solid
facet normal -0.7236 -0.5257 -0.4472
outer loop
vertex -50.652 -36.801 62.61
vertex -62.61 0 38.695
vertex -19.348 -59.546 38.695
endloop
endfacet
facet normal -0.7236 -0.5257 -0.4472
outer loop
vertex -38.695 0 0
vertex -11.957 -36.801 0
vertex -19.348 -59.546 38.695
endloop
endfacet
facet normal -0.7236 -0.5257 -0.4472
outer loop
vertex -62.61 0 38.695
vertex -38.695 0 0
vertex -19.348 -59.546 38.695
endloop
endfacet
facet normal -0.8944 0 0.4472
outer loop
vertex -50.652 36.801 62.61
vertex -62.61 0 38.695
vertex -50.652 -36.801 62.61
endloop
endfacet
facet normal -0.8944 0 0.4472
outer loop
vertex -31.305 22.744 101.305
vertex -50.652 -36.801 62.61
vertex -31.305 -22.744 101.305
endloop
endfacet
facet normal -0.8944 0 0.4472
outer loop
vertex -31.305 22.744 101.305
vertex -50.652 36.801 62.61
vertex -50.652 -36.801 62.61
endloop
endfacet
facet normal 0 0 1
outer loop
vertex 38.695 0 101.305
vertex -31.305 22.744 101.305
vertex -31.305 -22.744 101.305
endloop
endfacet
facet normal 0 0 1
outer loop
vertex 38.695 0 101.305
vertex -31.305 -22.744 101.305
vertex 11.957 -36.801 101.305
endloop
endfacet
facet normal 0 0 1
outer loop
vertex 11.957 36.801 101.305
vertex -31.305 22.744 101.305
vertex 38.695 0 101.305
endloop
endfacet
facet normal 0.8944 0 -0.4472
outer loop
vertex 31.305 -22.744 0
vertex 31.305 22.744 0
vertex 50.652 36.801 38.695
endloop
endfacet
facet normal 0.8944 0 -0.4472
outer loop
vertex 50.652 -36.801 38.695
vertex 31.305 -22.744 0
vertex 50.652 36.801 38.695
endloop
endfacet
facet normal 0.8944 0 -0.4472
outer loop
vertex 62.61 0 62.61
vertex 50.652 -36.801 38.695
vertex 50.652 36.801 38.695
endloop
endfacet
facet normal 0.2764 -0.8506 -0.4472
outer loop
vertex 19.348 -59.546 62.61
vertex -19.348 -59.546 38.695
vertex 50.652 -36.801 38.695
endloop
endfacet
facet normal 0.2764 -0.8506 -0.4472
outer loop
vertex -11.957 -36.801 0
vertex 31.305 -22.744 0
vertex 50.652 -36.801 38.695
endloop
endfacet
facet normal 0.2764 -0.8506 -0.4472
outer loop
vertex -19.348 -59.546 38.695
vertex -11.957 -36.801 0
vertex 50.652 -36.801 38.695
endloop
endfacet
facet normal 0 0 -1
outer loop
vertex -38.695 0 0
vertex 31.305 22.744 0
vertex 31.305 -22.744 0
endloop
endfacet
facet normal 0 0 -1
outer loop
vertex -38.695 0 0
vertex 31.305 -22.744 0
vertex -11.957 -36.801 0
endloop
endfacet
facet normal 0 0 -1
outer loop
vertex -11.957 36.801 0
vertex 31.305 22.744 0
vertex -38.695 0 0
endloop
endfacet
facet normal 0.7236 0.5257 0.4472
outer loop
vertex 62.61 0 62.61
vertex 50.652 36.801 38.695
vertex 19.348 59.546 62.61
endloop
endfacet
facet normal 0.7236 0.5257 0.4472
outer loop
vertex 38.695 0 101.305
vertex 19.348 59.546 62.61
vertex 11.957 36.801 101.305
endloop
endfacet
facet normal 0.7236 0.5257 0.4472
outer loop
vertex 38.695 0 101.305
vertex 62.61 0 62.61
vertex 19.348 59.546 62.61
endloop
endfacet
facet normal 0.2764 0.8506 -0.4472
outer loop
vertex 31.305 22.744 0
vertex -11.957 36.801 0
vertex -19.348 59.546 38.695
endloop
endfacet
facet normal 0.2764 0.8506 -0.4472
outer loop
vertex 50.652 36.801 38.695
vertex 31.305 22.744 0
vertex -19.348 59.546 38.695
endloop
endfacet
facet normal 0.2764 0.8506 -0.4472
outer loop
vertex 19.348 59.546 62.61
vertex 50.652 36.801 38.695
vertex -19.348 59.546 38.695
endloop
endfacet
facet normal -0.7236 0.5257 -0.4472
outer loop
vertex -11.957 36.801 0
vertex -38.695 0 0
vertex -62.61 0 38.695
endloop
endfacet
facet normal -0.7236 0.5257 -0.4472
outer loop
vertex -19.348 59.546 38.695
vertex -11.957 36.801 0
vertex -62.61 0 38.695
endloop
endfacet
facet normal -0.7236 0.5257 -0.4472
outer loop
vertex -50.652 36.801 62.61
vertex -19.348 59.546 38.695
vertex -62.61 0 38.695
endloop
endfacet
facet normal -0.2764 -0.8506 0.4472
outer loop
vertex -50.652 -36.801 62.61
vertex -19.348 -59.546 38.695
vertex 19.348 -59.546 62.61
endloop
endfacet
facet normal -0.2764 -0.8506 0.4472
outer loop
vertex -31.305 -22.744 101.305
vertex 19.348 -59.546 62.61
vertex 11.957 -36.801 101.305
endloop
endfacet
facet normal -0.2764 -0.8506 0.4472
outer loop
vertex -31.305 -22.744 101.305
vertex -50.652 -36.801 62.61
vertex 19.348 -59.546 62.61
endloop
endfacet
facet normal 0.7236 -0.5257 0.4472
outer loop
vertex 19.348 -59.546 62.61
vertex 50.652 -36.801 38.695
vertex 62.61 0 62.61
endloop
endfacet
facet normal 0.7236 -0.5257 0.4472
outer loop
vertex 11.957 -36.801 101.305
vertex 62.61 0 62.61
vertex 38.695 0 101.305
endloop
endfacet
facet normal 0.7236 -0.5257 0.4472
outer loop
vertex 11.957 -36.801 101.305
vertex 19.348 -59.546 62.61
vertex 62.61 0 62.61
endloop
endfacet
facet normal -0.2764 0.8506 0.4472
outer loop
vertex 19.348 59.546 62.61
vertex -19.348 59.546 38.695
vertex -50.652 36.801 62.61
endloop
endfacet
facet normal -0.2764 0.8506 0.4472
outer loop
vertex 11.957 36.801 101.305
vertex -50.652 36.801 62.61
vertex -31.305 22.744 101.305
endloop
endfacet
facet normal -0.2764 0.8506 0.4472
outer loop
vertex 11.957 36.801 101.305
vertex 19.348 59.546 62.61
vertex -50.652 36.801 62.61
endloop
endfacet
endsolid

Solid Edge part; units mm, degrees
sketch "Sketch1" plane through (0, 0, 0) normal (0, -1, 0) x (1, 0, 0)
  line L0 (0, 151.7064) -> (0, -50.4015)
  arc A0 (0, 151.7065) -> (0, -50.4015) centre (0, 50.6525) cw
revolve "RevolvedProtrusion1" add sketch "Sketch1" angle 360 about axis through (0, 0, 151.7064) along (0, 0, -1)
sketch "Sketch2" plane through (0, 0, 0) normal (0, -1, 0) x (1, 0, 0)
  line L0 (62.6099, 62.6099) -> (31.305, 0)
  line L1 (31.305, 0) -> (-38.695, 0)
extrude "Cutout1" cut sketch "Sketch2" along normal mid plane 851.8671 material side at (47.0022, 0, 31.2826)
sketch "Sketch3" plane through (0, 0, 0) normal (0, -1, 0) x (1, 0, 0)
  line L0 (-31.305, 101.305) -> (38.695, 101.305)
  line L1 (-62.6099, 38.695) -> (-31.305, 101.305)
extrude "ExtrudedCutout_17" cut sketch "Sketch3" along normal mid plane 614.7236 material side at (3.695, 0, 101.355)
pattern_circular "Pattern1" count 5 over 360 about axis through (0, 0, 0) along (0, 0, 1) of "ExtrudedCutout_17", "Cutout1"
